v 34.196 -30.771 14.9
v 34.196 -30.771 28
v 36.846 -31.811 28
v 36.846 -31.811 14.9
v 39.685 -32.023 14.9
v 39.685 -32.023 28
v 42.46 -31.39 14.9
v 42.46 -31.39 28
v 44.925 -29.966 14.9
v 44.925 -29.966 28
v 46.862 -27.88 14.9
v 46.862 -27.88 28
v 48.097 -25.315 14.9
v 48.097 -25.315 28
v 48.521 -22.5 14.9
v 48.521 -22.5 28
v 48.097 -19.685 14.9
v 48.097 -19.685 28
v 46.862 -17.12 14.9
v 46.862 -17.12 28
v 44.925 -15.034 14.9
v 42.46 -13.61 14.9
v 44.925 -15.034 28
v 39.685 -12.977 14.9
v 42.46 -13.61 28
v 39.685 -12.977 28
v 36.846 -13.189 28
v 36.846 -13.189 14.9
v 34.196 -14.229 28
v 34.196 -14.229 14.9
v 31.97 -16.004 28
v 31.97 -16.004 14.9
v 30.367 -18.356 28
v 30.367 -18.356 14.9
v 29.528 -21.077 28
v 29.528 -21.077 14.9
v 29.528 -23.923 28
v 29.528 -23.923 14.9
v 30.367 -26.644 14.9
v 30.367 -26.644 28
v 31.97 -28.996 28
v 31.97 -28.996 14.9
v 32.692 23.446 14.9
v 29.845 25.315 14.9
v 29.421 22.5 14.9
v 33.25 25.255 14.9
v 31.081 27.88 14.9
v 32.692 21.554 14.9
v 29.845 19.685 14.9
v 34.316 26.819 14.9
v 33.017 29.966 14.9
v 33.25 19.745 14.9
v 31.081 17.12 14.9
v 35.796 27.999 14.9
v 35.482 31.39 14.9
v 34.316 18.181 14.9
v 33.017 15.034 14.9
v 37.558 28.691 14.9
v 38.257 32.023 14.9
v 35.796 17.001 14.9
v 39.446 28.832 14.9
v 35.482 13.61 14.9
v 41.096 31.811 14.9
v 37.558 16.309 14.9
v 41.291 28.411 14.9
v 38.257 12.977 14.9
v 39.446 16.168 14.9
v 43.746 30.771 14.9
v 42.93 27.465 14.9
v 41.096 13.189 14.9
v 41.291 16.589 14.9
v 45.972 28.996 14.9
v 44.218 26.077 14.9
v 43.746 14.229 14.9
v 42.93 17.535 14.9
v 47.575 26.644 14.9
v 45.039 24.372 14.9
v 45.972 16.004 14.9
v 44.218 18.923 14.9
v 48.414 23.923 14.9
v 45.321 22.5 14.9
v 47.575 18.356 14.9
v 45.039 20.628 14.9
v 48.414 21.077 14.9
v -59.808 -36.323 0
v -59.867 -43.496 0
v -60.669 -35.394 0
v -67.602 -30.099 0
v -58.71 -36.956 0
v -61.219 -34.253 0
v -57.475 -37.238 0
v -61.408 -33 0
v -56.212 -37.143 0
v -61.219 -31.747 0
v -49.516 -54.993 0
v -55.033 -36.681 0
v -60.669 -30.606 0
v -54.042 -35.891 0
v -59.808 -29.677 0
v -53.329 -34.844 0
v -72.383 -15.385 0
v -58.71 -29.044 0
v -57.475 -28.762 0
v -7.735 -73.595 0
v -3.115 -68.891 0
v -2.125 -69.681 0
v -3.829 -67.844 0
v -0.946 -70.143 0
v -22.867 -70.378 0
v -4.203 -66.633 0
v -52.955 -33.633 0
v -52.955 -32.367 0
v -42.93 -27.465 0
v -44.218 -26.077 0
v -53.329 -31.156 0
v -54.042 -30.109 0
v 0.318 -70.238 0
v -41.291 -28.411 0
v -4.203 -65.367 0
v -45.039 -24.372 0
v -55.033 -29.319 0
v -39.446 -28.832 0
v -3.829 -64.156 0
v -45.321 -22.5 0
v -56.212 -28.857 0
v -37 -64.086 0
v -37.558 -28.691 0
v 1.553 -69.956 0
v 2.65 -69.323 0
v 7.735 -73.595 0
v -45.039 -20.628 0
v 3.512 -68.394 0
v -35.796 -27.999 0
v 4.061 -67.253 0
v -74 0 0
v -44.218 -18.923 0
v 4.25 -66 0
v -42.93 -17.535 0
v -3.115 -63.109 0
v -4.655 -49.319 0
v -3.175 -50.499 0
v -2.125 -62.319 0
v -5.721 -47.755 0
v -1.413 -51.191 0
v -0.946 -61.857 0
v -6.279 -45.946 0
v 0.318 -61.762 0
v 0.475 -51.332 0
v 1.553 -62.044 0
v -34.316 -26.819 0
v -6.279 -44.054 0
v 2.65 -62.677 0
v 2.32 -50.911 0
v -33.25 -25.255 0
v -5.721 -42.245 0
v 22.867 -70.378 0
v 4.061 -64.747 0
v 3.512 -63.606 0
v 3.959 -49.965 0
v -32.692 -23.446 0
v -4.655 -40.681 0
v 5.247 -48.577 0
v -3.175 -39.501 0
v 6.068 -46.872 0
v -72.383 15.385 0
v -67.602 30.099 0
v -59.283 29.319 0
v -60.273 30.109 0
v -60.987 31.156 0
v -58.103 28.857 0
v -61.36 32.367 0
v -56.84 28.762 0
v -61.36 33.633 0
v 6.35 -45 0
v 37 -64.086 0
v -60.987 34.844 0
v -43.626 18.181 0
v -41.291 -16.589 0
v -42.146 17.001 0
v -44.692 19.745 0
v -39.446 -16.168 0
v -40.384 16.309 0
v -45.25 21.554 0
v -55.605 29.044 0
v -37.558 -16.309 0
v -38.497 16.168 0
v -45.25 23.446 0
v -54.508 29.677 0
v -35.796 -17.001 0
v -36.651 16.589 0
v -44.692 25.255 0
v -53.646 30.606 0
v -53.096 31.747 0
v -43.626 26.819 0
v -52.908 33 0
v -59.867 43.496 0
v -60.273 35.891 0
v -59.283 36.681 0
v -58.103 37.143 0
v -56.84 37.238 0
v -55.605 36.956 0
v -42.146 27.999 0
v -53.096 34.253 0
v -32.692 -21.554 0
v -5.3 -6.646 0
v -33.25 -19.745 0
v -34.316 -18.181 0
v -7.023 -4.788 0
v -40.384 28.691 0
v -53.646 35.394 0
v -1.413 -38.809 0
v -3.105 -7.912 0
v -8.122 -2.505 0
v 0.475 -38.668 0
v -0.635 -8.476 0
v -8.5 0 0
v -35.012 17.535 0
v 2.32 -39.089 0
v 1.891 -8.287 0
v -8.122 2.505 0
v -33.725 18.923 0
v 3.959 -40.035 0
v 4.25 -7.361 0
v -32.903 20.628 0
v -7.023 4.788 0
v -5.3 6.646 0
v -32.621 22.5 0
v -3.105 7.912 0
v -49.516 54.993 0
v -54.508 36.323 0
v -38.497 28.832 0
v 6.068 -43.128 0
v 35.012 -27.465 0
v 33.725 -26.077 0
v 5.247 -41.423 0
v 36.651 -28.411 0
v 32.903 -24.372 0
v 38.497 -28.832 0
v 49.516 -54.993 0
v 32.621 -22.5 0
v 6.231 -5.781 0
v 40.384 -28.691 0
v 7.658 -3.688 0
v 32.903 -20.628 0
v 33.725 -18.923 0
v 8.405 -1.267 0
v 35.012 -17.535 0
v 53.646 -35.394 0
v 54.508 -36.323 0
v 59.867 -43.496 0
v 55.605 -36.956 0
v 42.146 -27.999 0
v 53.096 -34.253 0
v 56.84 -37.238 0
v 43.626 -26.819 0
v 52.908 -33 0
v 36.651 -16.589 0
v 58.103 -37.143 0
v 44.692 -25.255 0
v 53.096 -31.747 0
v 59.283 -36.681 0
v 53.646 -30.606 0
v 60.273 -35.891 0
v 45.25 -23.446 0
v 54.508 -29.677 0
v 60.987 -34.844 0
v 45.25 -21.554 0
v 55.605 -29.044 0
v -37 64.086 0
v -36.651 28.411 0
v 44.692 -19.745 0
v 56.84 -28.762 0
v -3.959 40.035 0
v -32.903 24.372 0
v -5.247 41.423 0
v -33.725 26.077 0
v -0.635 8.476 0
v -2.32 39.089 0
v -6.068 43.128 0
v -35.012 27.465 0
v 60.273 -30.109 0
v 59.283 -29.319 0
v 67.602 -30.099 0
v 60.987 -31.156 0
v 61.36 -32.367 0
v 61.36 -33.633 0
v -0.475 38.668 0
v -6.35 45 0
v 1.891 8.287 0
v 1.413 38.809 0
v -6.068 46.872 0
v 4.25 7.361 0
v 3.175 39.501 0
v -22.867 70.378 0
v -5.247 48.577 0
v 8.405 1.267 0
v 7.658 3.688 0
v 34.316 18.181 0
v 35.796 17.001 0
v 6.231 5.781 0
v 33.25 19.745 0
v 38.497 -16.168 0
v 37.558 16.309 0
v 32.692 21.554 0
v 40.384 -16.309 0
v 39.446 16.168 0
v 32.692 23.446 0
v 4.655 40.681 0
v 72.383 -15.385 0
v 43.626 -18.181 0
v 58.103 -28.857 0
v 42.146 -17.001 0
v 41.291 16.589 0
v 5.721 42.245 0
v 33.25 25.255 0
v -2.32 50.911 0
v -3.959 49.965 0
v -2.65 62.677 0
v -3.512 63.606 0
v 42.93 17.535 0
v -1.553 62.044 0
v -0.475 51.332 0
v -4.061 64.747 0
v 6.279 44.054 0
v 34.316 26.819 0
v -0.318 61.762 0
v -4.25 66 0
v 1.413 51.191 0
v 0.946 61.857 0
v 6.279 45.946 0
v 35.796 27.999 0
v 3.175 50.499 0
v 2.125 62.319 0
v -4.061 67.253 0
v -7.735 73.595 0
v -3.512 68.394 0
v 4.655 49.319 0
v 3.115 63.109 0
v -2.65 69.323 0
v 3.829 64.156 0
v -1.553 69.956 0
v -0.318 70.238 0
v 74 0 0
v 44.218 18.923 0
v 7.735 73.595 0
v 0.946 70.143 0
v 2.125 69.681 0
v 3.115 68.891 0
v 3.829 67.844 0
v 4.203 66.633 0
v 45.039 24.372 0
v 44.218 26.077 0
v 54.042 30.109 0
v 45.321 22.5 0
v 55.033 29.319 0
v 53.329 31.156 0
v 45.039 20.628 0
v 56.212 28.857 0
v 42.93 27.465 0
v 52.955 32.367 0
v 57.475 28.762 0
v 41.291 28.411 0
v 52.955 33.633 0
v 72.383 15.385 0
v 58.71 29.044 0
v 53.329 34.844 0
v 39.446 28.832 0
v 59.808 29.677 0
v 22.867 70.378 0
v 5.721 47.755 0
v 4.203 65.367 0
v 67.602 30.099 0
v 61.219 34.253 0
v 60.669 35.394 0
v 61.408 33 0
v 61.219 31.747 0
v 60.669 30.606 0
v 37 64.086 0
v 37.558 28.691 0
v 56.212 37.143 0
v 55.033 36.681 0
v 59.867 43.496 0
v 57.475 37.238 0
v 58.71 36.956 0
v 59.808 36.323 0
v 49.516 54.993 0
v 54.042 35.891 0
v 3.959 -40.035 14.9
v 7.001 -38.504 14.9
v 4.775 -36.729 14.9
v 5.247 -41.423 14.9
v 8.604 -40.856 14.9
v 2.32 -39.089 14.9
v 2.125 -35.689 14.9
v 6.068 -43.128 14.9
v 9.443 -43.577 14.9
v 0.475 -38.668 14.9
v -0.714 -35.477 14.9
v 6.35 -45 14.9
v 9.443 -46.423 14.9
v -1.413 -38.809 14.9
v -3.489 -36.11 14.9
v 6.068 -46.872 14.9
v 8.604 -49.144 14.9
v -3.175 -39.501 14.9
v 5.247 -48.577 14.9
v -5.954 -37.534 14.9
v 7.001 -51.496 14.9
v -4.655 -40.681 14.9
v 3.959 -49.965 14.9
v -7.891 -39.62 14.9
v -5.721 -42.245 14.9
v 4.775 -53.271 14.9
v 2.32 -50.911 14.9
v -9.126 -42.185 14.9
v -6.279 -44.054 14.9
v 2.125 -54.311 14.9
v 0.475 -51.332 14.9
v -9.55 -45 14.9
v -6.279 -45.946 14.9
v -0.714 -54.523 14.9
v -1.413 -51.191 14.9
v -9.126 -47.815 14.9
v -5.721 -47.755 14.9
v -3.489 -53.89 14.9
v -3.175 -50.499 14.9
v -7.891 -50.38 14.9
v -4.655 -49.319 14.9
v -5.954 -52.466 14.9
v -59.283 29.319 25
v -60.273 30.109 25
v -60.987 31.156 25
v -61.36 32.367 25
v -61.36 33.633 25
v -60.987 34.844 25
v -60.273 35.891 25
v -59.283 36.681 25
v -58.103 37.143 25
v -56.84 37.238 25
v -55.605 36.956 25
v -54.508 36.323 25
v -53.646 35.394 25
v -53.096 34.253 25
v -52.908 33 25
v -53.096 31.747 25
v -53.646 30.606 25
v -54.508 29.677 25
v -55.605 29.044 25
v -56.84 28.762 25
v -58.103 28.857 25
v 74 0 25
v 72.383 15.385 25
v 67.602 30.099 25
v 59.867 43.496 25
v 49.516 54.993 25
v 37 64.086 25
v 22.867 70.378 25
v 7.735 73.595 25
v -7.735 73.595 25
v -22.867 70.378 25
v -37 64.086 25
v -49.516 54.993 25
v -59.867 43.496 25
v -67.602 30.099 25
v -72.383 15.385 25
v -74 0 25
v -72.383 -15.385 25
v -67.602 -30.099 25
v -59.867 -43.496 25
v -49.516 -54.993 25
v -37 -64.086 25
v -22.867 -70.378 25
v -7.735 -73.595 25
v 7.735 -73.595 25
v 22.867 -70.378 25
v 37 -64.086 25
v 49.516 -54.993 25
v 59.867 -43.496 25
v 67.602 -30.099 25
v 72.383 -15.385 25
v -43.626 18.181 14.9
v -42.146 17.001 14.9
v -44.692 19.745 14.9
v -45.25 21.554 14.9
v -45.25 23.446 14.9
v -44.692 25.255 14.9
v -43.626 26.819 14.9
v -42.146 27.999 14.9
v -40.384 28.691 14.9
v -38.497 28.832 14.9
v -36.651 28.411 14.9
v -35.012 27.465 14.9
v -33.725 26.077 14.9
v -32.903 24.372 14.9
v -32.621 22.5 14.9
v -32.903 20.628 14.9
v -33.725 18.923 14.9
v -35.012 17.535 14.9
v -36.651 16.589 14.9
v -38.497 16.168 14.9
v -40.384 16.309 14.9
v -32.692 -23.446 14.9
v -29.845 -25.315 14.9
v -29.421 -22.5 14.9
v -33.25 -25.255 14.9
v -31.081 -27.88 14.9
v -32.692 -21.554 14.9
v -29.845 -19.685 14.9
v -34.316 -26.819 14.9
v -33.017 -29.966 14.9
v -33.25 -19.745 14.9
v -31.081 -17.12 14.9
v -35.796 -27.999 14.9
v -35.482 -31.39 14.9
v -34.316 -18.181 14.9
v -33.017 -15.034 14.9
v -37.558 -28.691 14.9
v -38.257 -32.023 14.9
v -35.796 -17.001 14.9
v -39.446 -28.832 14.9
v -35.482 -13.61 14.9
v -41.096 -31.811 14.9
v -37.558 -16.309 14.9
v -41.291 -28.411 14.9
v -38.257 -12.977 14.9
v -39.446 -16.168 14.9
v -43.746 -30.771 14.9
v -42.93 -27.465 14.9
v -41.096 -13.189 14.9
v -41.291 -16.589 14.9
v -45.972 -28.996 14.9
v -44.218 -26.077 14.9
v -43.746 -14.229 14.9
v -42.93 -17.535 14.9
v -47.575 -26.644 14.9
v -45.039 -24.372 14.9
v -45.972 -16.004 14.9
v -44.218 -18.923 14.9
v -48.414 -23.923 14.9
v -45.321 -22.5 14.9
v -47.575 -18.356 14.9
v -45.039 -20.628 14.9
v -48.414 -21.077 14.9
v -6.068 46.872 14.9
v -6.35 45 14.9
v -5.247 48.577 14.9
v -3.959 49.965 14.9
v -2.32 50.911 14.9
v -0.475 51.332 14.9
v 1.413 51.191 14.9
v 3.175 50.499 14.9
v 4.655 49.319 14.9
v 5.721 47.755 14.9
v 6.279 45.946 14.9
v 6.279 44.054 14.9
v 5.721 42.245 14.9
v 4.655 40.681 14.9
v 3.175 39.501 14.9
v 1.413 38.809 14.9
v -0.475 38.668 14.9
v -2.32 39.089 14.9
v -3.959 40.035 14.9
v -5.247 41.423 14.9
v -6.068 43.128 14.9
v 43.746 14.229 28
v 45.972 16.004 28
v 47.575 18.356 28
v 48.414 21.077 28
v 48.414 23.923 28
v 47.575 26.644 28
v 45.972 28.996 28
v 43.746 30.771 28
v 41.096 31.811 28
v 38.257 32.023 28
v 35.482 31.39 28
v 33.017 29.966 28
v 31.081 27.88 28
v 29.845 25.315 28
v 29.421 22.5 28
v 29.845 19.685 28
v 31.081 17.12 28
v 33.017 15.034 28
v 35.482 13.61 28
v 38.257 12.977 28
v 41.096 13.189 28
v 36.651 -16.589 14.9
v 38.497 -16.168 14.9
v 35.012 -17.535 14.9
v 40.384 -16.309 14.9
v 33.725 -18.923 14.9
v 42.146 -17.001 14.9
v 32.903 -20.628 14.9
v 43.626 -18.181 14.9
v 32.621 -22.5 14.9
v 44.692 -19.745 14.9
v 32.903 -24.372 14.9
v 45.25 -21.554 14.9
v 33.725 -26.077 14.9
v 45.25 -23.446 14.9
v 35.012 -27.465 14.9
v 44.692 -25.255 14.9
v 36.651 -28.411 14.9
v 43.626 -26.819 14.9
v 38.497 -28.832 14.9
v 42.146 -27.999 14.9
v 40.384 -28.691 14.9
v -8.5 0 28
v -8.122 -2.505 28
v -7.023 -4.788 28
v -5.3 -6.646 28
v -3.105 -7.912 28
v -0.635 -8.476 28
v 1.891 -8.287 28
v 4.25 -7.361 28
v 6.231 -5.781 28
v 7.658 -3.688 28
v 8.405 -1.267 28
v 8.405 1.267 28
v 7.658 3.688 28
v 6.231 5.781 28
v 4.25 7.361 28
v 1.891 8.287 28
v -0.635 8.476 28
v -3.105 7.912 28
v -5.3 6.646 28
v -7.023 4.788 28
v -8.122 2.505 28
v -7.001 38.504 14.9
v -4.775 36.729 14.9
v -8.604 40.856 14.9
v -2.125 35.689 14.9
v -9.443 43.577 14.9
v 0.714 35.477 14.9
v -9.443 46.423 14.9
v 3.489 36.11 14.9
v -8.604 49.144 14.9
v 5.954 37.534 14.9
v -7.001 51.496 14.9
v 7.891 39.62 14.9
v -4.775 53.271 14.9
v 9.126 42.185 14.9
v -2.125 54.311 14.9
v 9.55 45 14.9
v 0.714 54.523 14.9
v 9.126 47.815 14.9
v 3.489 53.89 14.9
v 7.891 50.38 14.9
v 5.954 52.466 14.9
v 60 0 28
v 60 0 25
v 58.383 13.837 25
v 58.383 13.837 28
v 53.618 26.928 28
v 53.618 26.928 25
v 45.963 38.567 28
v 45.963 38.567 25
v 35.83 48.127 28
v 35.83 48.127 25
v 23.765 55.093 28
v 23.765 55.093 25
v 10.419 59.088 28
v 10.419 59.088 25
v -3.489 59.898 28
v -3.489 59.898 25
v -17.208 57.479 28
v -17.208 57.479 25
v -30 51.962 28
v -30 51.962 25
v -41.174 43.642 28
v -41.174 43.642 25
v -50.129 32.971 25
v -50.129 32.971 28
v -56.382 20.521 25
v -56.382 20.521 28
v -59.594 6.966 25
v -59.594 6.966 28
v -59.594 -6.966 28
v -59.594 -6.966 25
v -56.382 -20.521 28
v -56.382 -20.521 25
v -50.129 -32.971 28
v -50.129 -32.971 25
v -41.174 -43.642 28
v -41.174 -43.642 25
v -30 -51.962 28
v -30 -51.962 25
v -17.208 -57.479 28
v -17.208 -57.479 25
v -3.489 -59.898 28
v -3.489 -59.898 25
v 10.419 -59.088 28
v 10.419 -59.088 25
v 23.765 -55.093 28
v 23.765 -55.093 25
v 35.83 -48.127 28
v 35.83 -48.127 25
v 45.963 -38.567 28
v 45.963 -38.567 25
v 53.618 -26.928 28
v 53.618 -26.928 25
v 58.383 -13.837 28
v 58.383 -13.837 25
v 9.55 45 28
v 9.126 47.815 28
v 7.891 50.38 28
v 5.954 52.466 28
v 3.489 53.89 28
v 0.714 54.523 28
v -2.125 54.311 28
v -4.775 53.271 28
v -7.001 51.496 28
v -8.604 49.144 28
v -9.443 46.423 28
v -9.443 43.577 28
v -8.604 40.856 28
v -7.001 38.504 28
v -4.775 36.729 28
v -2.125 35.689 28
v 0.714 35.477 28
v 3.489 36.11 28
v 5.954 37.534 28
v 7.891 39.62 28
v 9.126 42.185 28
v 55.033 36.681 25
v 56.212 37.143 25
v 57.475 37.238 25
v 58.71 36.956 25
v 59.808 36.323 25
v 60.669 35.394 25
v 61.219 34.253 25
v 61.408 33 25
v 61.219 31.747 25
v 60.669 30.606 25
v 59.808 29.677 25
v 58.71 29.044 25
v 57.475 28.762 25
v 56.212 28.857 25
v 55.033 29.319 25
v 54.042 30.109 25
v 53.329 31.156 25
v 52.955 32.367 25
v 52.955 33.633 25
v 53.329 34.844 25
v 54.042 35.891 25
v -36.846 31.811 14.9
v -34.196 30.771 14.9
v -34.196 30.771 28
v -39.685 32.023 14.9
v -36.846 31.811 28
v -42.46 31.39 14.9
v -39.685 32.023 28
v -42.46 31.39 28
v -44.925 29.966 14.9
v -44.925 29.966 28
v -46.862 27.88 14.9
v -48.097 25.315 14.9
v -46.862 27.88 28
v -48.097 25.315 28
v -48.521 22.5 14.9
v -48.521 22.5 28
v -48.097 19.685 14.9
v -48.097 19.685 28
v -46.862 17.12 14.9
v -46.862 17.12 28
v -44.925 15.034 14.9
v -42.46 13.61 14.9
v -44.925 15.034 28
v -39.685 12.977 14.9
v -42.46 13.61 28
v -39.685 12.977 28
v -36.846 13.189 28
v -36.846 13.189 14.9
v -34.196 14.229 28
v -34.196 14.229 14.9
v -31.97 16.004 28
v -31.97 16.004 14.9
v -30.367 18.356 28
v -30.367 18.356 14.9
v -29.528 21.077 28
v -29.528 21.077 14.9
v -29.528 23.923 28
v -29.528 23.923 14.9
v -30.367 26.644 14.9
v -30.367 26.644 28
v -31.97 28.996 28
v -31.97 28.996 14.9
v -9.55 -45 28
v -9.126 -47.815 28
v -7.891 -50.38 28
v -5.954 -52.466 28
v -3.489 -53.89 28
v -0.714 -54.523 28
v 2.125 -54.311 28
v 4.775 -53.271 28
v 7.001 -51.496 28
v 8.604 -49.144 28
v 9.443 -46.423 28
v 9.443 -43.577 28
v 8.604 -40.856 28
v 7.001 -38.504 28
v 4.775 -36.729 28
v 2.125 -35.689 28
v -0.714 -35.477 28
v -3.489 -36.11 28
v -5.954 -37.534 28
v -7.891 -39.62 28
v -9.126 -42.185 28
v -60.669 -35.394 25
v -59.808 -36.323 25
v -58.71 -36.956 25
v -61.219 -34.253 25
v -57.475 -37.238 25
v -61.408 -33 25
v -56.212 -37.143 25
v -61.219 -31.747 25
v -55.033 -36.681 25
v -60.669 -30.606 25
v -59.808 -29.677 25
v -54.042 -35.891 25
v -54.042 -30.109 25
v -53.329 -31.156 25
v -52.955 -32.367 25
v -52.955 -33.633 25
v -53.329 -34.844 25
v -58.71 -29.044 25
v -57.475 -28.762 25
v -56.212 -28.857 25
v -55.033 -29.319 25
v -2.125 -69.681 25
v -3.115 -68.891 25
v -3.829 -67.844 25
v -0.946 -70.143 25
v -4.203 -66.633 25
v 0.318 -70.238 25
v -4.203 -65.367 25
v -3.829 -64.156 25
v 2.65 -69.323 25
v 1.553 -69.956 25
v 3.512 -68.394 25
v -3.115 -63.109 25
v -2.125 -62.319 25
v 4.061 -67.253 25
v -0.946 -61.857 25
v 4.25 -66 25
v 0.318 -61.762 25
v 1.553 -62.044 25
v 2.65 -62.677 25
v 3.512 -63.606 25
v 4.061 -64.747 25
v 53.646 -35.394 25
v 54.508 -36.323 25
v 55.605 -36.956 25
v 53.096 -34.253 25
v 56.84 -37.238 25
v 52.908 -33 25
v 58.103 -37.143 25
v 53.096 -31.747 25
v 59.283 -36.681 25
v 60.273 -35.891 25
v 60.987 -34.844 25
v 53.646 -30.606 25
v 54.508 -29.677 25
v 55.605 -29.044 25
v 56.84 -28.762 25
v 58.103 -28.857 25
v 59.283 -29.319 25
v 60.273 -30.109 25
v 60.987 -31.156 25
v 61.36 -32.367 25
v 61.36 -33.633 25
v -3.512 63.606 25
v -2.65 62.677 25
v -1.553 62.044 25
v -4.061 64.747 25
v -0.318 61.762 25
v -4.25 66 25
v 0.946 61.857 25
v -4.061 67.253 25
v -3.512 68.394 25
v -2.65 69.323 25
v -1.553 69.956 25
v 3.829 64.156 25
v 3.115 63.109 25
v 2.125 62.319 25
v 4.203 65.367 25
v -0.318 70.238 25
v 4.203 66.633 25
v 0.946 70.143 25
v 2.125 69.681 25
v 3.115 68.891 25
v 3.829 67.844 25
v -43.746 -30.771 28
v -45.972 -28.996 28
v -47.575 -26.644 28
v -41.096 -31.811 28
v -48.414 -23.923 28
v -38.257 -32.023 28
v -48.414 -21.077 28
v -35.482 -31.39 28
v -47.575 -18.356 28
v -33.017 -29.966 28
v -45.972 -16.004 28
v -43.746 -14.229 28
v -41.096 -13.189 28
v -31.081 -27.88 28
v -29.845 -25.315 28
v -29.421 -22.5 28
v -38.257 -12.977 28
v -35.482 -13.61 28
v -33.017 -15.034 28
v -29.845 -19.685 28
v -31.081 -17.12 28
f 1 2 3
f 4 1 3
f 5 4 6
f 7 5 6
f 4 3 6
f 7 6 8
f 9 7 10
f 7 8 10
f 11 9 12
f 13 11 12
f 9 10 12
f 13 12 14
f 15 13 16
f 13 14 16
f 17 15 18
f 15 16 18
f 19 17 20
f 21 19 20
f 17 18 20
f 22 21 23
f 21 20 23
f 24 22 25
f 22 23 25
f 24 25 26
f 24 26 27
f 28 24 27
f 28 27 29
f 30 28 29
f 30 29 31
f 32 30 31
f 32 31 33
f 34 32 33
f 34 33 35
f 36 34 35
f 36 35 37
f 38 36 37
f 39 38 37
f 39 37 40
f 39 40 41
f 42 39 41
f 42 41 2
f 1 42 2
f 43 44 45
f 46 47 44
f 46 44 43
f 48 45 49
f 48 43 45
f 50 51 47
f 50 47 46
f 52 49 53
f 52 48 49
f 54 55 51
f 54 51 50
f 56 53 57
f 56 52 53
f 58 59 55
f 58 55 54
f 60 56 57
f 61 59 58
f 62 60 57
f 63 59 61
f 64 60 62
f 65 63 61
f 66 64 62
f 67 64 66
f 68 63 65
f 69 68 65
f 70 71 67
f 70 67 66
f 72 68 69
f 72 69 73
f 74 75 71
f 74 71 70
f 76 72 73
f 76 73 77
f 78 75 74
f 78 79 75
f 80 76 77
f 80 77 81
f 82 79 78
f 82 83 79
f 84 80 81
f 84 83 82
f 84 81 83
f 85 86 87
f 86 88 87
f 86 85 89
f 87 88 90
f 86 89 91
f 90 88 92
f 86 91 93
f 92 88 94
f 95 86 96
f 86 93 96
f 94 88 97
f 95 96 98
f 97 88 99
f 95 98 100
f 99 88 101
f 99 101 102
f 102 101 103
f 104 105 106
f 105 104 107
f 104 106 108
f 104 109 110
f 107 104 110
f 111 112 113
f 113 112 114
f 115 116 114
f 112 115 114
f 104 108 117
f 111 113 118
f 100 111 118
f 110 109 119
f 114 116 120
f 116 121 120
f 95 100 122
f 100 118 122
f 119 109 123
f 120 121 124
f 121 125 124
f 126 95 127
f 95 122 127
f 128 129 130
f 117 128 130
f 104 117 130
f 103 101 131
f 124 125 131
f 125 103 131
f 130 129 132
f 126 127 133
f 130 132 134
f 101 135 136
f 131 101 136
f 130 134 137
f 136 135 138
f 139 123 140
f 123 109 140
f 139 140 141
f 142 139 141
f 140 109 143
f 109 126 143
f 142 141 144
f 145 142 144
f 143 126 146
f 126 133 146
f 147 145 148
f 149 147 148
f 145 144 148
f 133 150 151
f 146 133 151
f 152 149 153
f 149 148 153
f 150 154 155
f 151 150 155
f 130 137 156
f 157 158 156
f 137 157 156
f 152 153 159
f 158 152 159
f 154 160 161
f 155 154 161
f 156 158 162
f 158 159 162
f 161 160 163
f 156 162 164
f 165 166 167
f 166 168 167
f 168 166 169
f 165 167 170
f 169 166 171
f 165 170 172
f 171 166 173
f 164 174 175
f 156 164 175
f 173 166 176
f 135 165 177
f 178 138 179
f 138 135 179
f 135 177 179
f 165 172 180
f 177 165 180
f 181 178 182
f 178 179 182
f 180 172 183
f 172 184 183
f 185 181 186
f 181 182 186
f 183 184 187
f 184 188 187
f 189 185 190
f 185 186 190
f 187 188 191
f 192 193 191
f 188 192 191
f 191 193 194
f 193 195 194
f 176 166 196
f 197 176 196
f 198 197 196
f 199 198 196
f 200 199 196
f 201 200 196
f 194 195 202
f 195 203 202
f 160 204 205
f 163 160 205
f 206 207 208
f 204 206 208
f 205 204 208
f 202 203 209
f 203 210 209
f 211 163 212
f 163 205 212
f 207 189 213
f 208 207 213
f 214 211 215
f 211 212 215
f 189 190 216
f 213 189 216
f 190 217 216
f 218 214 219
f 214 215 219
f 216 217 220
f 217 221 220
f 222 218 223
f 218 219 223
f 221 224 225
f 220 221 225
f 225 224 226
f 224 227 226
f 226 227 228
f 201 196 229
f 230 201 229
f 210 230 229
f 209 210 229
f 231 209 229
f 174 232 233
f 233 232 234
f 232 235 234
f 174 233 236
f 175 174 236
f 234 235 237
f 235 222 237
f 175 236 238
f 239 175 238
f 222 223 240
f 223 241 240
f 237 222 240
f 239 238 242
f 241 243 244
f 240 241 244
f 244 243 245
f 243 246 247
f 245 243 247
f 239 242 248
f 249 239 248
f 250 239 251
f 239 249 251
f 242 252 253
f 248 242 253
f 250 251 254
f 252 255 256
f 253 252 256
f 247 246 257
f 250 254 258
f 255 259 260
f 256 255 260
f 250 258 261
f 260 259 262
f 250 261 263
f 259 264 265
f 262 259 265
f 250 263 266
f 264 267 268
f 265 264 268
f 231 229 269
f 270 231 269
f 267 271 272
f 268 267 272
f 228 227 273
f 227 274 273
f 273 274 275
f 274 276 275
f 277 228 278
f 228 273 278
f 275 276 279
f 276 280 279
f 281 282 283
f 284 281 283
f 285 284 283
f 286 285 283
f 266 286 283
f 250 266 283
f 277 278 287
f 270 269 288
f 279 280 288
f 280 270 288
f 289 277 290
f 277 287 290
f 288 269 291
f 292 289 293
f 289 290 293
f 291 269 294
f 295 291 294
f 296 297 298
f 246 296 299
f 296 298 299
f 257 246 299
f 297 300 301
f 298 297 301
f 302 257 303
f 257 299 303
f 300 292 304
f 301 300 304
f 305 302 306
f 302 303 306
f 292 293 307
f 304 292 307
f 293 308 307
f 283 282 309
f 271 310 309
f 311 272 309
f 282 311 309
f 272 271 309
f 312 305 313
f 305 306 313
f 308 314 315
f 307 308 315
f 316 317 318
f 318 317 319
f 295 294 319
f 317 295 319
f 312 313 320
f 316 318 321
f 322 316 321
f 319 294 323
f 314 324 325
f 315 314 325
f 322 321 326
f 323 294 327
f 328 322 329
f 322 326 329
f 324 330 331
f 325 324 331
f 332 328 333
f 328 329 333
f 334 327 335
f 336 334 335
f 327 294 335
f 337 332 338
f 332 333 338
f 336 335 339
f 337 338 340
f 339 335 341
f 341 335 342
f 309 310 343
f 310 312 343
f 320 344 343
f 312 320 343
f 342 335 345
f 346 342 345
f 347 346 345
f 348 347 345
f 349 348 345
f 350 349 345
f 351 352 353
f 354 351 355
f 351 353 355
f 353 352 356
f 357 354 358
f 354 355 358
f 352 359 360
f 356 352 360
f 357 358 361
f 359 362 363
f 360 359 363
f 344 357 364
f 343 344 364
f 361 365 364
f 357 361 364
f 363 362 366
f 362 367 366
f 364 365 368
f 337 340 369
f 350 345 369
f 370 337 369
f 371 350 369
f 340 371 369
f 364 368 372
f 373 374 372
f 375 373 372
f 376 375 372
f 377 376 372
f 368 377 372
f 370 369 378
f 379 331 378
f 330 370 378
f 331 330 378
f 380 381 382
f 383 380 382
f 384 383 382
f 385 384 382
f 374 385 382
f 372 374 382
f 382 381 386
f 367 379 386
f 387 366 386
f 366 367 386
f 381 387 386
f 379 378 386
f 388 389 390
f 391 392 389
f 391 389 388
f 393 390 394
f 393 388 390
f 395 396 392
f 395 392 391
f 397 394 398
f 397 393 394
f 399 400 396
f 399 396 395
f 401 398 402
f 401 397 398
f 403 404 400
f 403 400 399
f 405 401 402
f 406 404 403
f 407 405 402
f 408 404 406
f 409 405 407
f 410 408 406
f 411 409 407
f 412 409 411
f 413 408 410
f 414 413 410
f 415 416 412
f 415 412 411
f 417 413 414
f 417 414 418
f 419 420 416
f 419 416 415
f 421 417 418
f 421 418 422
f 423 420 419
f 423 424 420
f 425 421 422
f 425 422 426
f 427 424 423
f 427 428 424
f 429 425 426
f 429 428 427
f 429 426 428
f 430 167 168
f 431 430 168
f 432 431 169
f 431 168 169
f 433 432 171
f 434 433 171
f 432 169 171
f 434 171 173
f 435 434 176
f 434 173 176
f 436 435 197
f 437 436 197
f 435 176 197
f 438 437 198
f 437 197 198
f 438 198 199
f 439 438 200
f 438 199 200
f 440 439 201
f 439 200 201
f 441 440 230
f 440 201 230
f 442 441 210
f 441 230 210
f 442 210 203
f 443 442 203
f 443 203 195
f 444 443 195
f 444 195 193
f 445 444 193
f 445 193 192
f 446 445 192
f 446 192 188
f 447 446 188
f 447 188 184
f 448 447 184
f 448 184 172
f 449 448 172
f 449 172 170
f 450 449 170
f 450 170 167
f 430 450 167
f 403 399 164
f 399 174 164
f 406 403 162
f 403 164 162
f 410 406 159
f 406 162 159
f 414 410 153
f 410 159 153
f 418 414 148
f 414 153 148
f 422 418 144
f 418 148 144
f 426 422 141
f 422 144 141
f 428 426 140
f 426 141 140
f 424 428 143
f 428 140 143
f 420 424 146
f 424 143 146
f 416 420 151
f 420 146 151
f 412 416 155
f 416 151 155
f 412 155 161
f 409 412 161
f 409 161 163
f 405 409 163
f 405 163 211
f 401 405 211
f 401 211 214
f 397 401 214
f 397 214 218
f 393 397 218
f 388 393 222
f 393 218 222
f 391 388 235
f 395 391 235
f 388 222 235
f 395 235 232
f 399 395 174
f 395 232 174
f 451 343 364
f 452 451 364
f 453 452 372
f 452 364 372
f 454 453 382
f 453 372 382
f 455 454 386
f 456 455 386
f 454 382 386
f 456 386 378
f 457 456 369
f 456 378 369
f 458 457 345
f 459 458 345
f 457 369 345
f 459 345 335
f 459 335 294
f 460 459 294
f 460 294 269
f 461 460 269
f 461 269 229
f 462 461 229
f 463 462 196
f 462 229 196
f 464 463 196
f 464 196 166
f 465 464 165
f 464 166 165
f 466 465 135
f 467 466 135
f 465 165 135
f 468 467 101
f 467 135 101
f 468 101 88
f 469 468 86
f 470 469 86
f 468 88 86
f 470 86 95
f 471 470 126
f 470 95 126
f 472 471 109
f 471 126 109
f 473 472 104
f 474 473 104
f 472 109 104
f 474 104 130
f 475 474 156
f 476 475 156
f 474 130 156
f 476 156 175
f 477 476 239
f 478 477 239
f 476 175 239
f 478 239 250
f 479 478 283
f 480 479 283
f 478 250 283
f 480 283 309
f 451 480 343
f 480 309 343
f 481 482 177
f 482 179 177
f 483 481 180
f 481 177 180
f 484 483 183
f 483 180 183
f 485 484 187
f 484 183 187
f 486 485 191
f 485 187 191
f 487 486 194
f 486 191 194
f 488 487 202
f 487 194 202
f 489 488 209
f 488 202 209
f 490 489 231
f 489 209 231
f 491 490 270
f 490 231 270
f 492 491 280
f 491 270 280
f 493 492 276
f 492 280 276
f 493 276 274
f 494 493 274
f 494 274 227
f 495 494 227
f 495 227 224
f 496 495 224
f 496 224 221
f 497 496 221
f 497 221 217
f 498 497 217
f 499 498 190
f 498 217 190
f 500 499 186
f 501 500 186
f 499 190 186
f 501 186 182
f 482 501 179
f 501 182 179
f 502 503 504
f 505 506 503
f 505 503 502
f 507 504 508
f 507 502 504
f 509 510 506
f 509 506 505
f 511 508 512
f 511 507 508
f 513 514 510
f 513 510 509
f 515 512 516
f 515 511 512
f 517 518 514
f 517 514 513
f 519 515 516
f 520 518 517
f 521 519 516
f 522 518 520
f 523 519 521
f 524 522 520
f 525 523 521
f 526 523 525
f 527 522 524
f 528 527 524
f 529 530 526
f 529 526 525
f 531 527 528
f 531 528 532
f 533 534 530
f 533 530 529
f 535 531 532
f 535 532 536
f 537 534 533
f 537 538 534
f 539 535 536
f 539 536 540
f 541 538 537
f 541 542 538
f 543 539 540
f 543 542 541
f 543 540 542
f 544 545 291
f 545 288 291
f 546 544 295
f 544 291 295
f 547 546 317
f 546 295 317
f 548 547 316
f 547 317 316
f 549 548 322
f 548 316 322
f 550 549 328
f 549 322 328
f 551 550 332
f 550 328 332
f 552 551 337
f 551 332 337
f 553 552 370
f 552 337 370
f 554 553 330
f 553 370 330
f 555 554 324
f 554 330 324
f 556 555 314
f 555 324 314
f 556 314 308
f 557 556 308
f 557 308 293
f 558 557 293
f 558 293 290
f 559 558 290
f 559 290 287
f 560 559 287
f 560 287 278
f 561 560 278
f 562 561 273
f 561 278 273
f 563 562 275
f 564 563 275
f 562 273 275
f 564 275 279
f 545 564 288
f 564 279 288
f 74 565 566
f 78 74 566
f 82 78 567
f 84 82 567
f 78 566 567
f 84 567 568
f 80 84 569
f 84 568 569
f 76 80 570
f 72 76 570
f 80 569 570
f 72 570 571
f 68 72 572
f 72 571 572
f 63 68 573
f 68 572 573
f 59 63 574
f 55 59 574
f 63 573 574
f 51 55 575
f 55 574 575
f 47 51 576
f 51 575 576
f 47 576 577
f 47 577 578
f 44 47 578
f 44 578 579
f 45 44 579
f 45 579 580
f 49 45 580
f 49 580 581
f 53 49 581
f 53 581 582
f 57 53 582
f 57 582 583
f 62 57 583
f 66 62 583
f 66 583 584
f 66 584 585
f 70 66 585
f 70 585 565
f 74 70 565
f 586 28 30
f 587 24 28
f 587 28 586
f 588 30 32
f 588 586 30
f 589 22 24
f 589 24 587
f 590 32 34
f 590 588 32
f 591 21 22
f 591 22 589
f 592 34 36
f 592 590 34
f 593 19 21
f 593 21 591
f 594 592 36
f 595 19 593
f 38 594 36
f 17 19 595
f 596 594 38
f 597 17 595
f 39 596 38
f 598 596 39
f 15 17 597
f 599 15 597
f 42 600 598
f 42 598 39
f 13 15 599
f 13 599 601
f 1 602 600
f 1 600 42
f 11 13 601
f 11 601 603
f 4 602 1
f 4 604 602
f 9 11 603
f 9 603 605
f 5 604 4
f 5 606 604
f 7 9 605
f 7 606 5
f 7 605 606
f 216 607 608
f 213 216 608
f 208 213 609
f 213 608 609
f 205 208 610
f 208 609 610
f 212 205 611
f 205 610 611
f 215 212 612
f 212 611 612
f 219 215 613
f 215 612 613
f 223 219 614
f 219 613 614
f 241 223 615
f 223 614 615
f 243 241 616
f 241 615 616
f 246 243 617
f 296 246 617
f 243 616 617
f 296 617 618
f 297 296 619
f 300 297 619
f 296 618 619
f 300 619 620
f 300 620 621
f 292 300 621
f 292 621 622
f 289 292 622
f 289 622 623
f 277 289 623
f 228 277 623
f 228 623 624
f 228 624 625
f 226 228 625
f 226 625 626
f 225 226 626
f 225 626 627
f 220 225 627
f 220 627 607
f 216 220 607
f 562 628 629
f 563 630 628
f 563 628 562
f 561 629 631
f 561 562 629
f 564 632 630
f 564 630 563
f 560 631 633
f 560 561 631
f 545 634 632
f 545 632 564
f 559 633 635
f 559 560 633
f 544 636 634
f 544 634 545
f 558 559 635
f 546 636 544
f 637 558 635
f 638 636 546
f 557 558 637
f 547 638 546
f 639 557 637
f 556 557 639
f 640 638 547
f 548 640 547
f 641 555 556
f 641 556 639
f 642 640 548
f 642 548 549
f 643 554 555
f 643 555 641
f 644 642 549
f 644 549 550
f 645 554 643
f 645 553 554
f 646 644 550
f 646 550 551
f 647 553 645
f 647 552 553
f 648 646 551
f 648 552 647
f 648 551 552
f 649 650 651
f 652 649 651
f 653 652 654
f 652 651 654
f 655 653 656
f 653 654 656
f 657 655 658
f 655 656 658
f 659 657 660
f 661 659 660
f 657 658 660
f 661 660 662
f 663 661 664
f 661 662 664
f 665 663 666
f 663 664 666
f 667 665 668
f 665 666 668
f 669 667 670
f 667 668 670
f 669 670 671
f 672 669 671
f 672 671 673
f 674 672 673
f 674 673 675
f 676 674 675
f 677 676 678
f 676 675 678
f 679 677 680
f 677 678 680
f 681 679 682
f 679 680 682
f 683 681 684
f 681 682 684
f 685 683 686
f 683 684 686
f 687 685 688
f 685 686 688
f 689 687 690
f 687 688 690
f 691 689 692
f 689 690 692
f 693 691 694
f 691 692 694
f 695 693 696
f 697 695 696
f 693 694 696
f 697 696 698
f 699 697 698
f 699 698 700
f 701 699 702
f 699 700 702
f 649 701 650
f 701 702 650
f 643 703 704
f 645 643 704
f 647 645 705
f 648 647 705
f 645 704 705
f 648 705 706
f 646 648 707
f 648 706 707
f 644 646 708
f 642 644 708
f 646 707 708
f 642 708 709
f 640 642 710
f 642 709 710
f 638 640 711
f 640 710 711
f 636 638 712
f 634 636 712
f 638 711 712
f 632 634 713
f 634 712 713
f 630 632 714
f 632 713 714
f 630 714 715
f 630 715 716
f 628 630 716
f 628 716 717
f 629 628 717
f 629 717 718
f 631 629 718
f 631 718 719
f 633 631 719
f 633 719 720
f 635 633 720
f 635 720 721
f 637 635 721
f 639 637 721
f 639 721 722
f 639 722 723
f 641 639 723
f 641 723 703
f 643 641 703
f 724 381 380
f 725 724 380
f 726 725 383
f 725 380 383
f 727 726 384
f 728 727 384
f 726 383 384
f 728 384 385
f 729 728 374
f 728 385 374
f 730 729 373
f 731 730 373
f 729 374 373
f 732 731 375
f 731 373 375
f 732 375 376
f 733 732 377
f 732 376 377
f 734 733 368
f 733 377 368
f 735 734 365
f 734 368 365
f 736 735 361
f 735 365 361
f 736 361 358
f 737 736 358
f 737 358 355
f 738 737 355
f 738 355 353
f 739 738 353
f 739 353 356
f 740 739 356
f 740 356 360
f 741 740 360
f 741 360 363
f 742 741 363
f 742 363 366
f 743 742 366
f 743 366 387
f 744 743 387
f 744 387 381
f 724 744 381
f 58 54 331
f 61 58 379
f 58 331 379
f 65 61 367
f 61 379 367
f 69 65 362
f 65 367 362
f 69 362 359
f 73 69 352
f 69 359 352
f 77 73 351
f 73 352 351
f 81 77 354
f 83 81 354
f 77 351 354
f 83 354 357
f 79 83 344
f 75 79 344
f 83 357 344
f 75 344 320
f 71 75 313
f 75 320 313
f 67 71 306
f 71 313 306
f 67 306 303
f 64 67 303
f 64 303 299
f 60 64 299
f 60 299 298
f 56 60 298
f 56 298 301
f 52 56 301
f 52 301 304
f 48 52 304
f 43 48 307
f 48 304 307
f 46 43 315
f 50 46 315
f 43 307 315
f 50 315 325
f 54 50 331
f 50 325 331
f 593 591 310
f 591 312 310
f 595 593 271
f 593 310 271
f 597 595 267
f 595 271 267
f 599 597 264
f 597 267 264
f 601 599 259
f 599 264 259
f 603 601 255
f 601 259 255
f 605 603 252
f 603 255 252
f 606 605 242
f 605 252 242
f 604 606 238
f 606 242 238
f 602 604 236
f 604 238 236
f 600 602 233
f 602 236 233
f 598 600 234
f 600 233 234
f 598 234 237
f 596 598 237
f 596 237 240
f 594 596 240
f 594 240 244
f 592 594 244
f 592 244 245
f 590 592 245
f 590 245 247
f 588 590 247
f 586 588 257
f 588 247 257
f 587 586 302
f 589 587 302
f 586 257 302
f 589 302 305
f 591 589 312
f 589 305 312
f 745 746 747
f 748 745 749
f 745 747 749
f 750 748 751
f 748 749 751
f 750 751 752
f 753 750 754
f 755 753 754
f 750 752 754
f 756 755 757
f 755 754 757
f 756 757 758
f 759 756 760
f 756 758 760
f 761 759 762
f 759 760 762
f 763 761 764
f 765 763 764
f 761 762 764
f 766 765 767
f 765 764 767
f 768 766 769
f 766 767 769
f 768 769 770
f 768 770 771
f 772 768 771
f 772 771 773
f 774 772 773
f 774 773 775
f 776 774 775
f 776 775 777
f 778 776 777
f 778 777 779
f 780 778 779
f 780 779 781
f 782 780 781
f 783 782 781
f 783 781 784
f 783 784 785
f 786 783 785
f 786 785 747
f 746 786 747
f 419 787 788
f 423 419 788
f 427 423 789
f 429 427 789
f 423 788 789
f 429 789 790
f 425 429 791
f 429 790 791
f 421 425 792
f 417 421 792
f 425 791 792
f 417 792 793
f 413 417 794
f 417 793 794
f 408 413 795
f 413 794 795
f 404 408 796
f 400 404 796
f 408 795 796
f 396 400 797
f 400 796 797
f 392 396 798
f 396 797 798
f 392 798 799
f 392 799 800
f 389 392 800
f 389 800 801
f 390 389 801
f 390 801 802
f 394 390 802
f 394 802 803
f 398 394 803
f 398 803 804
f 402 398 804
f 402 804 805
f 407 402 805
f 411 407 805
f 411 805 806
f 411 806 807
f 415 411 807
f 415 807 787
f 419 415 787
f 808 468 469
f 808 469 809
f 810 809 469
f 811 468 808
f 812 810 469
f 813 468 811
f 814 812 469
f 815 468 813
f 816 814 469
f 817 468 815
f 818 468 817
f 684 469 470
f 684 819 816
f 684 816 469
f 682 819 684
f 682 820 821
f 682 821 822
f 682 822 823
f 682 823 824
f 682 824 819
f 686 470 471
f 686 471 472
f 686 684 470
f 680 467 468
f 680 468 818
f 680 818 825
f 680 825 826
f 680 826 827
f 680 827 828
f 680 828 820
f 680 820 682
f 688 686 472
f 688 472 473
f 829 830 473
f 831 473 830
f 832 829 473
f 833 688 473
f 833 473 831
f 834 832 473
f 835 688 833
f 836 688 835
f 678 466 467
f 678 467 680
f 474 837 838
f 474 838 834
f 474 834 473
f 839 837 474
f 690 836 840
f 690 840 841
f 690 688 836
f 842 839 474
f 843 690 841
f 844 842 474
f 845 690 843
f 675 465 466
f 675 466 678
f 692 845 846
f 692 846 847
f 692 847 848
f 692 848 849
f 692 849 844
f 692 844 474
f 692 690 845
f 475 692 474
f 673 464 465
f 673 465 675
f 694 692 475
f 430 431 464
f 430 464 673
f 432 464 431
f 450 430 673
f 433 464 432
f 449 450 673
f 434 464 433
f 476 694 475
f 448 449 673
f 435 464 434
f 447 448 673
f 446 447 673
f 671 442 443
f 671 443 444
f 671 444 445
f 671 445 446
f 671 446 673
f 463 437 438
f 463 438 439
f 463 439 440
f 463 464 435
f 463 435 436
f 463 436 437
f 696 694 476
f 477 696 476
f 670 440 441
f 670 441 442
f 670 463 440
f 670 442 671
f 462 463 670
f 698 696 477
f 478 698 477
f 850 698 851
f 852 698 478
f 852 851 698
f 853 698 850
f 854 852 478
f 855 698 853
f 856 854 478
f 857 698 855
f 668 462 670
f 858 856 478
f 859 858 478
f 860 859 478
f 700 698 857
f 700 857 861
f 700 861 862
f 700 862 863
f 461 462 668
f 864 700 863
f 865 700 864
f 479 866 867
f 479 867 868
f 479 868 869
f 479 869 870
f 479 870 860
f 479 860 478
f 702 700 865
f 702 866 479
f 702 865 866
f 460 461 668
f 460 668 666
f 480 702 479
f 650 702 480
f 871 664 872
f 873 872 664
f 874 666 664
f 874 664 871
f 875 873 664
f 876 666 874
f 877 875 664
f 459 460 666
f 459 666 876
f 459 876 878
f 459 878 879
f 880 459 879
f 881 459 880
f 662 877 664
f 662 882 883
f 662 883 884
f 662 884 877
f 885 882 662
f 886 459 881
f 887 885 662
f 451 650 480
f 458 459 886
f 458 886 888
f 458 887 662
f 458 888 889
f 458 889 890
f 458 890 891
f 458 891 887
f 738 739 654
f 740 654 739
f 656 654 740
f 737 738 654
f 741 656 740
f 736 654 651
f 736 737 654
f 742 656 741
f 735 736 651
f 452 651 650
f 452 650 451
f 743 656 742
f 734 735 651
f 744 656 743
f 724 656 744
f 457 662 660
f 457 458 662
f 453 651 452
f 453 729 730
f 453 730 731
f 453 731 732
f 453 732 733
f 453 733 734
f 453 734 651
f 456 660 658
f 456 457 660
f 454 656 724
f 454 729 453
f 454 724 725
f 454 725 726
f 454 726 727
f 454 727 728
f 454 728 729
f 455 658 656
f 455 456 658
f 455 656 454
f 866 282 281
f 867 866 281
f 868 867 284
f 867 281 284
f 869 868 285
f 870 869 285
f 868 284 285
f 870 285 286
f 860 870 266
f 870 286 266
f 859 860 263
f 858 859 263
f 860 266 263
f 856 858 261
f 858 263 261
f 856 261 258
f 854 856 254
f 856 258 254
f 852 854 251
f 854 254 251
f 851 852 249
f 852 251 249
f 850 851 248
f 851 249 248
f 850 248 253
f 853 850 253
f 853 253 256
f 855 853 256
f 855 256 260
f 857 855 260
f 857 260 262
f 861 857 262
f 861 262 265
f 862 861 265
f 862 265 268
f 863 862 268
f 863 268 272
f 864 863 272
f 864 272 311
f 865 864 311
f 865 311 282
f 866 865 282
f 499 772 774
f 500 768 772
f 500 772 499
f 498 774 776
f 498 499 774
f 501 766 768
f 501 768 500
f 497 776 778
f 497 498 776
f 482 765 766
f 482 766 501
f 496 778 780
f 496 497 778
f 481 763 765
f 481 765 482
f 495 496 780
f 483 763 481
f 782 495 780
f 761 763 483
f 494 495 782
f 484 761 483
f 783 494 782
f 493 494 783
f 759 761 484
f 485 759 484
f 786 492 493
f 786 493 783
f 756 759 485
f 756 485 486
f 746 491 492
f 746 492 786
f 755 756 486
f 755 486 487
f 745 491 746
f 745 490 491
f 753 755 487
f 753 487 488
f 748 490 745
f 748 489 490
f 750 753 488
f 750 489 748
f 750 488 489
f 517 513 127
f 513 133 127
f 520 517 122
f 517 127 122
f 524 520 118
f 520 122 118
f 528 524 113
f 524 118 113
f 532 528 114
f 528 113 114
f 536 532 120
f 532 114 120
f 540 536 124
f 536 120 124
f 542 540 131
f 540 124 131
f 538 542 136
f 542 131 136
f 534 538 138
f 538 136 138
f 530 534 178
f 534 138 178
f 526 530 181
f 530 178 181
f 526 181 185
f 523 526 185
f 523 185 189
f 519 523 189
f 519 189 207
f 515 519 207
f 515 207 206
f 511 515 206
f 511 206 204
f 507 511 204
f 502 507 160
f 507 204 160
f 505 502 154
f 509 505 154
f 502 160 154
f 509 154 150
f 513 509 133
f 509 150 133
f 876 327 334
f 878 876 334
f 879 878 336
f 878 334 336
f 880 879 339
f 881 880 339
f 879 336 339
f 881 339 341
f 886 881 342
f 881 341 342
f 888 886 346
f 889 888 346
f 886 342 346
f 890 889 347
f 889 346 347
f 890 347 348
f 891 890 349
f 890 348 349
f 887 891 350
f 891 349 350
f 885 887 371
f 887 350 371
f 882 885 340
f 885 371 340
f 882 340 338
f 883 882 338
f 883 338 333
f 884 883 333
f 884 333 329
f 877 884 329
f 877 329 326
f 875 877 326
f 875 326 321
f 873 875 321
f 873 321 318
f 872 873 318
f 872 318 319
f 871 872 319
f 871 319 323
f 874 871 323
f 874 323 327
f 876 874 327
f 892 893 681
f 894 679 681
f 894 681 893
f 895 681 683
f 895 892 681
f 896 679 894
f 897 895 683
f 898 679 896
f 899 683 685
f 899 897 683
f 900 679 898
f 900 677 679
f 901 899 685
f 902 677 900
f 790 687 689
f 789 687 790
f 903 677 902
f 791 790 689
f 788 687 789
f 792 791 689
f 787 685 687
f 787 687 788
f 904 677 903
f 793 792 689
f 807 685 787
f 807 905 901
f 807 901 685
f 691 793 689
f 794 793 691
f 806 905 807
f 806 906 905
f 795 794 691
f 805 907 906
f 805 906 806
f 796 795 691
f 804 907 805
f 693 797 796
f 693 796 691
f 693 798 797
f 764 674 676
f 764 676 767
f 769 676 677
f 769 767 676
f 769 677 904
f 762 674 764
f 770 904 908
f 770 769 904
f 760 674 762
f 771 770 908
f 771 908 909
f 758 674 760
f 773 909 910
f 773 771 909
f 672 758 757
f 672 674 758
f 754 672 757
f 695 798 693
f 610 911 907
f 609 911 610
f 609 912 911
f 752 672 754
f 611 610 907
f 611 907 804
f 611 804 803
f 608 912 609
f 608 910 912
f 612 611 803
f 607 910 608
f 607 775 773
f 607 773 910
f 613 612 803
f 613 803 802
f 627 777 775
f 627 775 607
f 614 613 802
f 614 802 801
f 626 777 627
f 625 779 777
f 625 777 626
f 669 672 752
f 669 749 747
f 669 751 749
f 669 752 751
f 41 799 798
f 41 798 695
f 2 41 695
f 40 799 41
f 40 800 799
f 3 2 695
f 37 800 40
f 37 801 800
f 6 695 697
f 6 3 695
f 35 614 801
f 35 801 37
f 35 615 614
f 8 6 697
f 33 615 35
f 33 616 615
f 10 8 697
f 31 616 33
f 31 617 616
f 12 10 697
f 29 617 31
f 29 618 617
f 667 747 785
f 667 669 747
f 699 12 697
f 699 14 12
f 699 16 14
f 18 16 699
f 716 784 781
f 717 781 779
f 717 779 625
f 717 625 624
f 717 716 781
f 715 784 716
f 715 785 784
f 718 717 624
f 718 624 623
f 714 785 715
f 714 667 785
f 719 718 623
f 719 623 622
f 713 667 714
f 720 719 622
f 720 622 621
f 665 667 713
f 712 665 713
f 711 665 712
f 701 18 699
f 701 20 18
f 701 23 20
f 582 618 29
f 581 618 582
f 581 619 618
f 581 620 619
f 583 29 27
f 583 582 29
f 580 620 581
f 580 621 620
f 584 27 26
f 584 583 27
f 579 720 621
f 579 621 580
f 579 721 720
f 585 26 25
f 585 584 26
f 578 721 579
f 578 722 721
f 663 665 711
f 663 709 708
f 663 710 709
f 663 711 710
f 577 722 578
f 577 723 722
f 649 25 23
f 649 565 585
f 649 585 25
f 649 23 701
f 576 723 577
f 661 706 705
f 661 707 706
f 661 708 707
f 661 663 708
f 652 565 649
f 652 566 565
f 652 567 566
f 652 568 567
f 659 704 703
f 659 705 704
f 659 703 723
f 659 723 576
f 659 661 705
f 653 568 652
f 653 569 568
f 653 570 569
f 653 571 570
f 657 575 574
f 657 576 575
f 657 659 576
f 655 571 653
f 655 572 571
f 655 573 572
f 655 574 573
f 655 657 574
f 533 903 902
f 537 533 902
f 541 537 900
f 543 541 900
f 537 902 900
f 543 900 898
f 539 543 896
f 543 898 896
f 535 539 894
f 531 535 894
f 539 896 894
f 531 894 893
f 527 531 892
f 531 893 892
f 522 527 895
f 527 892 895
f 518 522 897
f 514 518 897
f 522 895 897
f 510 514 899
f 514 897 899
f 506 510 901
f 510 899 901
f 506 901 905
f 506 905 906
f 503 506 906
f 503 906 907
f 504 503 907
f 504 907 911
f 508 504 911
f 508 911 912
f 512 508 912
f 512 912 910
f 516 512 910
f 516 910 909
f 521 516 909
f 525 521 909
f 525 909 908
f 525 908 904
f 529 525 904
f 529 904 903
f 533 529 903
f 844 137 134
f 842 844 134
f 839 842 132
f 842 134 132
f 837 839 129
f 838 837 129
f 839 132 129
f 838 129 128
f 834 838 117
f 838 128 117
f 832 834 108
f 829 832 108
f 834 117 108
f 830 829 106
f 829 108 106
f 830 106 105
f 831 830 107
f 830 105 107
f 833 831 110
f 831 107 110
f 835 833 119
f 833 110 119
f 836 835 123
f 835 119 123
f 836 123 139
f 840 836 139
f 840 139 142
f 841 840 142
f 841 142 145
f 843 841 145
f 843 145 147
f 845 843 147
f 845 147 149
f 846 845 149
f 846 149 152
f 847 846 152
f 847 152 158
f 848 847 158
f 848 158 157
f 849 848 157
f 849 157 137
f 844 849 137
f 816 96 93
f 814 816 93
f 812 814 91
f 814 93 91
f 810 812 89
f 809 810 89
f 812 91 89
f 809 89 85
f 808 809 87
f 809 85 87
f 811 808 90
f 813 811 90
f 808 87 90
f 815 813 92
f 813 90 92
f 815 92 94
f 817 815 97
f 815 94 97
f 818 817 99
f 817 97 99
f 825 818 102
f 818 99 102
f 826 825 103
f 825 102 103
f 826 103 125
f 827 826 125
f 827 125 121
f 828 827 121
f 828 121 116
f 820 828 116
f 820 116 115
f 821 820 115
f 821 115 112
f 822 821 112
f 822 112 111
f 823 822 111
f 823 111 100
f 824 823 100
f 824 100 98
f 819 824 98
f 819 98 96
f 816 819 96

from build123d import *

# Parameters (mm, degrees)
F0_R            = 74
F1_DEPTH        = 25
F2_R            = 60
F3_DEPTH        = 3
F4_D            = 17
F6_D            = 8.5
F6_COPIES_COUNT = 6
F8_D            = 12.7
F8_CBORE_D      = 19.1
F8_CBORE_DEPTH  = 13.1
F8_COPIES_COUNT = 6


# Not quite as in the source:
# - a pattern or mirror of a feature is missing from the dataset's text; its kind, count and spacing are read off the source's solid


with BuildPart() as f1:
    # F0 (on Top) → F1 (new body)
    with BuildSketch(Plane.XY):
        Circle(F0_R)
    extrude(amount=F1_DEPTH)

    # F2 (on face) → F3 (join)
    with BuildSketch(Plane.XY.offset(25)):
        Circle(F2_R)
    extrude(amount=F3_DEPTH)

    # F4 (through all)
    with Locations(Plane(origin=(0, 0, 0), x_dir=(1, 0, 0), z_dir=(0, 0, -1))):
        with Locations((0, 0)):
            Hole(F4_D / 2)

    # F6 (through all)
    with Locations(Plane.XY.offset(25)):
        with Locations((0, 66)):
            f6 = Hole(F6_D / 2)

    # F6_copies: F6 ×6 about axis
    f6_copies_axis = Axis((0, 0, 0), (0, 0, 1))
    for i in range(1, F6_COPIES_COUNT):
        add(f6.rotate(f6_copies_axis, i * 360 / F6_COPIES_COUNT), mode=Mode.SUBTRACT)

    # F8 (through all)
    with Locations(Plane.XY.offset(28)):
        with Locations((0, 45)):
            f8 = CounterBoreHole(F8_D / 2, F8_CBORE_D / 2, F8_CBORE_DEPTH)

    # F8_copies: F8 ×6 about axis
    f8_copies_axis = Axis((0, 0, 0), (0, 0, 1))
    for i in range(1, F8_COPIES_COUNT):
        add(f8.rotate(f8_copies_axis, i * 360 / F8_COPIES_COUNT), mode=Mode.SUBTRACT)


solid = f1.part
